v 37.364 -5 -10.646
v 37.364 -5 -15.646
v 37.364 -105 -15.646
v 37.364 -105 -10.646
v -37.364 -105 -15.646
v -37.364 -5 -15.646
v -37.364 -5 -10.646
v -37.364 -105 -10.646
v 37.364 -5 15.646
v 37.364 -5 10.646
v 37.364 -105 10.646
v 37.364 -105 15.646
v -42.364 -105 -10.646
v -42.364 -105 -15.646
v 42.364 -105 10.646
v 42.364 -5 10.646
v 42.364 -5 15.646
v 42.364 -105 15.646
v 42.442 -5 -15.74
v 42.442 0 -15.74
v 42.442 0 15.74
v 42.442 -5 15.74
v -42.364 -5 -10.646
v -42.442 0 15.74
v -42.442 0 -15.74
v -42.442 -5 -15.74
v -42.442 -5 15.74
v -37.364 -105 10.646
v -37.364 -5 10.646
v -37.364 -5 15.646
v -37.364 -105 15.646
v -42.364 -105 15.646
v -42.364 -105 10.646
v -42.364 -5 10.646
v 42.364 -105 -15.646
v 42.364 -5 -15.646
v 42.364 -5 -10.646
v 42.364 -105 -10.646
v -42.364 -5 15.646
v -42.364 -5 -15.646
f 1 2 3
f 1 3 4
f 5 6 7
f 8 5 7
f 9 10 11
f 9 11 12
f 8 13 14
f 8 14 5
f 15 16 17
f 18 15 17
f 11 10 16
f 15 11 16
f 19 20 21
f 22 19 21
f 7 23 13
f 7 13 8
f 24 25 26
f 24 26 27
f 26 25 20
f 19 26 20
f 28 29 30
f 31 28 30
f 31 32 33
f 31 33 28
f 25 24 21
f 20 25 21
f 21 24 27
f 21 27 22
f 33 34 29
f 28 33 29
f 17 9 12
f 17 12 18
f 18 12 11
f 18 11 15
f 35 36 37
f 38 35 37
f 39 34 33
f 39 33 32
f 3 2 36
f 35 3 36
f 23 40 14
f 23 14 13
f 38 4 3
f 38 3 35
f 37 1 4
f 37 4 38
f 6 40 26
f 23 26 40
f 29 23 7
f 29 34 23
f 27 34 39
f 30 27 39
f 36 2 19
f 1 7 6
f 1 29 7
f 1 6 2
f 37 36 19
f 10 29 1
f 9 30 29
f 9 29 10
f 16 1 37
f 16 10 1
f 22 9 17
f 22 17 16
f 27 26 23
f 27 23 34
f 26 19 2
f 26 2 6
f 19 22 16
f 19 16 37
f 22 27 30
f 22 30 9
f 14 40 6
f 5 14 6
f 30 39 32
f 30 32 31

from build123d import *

# Parameters (mm, degrees)
F0_W     = 84.884792
F0_H     = 31.480454
F1_DEPTH = 5
F2_W     = 5
F2_H     = 5
F3_DEPTH = 105


with BuildPart() as f1:
    # F0 (on Front) → F1 (new body)
    with BuildSketch(Plane.XZ):
        Rectangle(F0_W, F0_H)
    extrude(amount=F1_DEPTH)

    # F2 (on Front) → F3 (join)
    with BuildSketch(Plane.XZ):
        with Locations((-39.864282, 13.145501)):
            Rectangle(F2_W, F2_H)
        with Locations((39.864282, 13.145501)):
            Rectangle(F2_W, F2_H)
        with Locations((39.864282, -13.145501)):
            Rectangle(F2_W, F2_H)
        with Locations((-39.864282, -13.145501)):
            Rectangle(F2_W, F2_H)
    extrude(amount=F3_DEPTH)


solid = f1.part
